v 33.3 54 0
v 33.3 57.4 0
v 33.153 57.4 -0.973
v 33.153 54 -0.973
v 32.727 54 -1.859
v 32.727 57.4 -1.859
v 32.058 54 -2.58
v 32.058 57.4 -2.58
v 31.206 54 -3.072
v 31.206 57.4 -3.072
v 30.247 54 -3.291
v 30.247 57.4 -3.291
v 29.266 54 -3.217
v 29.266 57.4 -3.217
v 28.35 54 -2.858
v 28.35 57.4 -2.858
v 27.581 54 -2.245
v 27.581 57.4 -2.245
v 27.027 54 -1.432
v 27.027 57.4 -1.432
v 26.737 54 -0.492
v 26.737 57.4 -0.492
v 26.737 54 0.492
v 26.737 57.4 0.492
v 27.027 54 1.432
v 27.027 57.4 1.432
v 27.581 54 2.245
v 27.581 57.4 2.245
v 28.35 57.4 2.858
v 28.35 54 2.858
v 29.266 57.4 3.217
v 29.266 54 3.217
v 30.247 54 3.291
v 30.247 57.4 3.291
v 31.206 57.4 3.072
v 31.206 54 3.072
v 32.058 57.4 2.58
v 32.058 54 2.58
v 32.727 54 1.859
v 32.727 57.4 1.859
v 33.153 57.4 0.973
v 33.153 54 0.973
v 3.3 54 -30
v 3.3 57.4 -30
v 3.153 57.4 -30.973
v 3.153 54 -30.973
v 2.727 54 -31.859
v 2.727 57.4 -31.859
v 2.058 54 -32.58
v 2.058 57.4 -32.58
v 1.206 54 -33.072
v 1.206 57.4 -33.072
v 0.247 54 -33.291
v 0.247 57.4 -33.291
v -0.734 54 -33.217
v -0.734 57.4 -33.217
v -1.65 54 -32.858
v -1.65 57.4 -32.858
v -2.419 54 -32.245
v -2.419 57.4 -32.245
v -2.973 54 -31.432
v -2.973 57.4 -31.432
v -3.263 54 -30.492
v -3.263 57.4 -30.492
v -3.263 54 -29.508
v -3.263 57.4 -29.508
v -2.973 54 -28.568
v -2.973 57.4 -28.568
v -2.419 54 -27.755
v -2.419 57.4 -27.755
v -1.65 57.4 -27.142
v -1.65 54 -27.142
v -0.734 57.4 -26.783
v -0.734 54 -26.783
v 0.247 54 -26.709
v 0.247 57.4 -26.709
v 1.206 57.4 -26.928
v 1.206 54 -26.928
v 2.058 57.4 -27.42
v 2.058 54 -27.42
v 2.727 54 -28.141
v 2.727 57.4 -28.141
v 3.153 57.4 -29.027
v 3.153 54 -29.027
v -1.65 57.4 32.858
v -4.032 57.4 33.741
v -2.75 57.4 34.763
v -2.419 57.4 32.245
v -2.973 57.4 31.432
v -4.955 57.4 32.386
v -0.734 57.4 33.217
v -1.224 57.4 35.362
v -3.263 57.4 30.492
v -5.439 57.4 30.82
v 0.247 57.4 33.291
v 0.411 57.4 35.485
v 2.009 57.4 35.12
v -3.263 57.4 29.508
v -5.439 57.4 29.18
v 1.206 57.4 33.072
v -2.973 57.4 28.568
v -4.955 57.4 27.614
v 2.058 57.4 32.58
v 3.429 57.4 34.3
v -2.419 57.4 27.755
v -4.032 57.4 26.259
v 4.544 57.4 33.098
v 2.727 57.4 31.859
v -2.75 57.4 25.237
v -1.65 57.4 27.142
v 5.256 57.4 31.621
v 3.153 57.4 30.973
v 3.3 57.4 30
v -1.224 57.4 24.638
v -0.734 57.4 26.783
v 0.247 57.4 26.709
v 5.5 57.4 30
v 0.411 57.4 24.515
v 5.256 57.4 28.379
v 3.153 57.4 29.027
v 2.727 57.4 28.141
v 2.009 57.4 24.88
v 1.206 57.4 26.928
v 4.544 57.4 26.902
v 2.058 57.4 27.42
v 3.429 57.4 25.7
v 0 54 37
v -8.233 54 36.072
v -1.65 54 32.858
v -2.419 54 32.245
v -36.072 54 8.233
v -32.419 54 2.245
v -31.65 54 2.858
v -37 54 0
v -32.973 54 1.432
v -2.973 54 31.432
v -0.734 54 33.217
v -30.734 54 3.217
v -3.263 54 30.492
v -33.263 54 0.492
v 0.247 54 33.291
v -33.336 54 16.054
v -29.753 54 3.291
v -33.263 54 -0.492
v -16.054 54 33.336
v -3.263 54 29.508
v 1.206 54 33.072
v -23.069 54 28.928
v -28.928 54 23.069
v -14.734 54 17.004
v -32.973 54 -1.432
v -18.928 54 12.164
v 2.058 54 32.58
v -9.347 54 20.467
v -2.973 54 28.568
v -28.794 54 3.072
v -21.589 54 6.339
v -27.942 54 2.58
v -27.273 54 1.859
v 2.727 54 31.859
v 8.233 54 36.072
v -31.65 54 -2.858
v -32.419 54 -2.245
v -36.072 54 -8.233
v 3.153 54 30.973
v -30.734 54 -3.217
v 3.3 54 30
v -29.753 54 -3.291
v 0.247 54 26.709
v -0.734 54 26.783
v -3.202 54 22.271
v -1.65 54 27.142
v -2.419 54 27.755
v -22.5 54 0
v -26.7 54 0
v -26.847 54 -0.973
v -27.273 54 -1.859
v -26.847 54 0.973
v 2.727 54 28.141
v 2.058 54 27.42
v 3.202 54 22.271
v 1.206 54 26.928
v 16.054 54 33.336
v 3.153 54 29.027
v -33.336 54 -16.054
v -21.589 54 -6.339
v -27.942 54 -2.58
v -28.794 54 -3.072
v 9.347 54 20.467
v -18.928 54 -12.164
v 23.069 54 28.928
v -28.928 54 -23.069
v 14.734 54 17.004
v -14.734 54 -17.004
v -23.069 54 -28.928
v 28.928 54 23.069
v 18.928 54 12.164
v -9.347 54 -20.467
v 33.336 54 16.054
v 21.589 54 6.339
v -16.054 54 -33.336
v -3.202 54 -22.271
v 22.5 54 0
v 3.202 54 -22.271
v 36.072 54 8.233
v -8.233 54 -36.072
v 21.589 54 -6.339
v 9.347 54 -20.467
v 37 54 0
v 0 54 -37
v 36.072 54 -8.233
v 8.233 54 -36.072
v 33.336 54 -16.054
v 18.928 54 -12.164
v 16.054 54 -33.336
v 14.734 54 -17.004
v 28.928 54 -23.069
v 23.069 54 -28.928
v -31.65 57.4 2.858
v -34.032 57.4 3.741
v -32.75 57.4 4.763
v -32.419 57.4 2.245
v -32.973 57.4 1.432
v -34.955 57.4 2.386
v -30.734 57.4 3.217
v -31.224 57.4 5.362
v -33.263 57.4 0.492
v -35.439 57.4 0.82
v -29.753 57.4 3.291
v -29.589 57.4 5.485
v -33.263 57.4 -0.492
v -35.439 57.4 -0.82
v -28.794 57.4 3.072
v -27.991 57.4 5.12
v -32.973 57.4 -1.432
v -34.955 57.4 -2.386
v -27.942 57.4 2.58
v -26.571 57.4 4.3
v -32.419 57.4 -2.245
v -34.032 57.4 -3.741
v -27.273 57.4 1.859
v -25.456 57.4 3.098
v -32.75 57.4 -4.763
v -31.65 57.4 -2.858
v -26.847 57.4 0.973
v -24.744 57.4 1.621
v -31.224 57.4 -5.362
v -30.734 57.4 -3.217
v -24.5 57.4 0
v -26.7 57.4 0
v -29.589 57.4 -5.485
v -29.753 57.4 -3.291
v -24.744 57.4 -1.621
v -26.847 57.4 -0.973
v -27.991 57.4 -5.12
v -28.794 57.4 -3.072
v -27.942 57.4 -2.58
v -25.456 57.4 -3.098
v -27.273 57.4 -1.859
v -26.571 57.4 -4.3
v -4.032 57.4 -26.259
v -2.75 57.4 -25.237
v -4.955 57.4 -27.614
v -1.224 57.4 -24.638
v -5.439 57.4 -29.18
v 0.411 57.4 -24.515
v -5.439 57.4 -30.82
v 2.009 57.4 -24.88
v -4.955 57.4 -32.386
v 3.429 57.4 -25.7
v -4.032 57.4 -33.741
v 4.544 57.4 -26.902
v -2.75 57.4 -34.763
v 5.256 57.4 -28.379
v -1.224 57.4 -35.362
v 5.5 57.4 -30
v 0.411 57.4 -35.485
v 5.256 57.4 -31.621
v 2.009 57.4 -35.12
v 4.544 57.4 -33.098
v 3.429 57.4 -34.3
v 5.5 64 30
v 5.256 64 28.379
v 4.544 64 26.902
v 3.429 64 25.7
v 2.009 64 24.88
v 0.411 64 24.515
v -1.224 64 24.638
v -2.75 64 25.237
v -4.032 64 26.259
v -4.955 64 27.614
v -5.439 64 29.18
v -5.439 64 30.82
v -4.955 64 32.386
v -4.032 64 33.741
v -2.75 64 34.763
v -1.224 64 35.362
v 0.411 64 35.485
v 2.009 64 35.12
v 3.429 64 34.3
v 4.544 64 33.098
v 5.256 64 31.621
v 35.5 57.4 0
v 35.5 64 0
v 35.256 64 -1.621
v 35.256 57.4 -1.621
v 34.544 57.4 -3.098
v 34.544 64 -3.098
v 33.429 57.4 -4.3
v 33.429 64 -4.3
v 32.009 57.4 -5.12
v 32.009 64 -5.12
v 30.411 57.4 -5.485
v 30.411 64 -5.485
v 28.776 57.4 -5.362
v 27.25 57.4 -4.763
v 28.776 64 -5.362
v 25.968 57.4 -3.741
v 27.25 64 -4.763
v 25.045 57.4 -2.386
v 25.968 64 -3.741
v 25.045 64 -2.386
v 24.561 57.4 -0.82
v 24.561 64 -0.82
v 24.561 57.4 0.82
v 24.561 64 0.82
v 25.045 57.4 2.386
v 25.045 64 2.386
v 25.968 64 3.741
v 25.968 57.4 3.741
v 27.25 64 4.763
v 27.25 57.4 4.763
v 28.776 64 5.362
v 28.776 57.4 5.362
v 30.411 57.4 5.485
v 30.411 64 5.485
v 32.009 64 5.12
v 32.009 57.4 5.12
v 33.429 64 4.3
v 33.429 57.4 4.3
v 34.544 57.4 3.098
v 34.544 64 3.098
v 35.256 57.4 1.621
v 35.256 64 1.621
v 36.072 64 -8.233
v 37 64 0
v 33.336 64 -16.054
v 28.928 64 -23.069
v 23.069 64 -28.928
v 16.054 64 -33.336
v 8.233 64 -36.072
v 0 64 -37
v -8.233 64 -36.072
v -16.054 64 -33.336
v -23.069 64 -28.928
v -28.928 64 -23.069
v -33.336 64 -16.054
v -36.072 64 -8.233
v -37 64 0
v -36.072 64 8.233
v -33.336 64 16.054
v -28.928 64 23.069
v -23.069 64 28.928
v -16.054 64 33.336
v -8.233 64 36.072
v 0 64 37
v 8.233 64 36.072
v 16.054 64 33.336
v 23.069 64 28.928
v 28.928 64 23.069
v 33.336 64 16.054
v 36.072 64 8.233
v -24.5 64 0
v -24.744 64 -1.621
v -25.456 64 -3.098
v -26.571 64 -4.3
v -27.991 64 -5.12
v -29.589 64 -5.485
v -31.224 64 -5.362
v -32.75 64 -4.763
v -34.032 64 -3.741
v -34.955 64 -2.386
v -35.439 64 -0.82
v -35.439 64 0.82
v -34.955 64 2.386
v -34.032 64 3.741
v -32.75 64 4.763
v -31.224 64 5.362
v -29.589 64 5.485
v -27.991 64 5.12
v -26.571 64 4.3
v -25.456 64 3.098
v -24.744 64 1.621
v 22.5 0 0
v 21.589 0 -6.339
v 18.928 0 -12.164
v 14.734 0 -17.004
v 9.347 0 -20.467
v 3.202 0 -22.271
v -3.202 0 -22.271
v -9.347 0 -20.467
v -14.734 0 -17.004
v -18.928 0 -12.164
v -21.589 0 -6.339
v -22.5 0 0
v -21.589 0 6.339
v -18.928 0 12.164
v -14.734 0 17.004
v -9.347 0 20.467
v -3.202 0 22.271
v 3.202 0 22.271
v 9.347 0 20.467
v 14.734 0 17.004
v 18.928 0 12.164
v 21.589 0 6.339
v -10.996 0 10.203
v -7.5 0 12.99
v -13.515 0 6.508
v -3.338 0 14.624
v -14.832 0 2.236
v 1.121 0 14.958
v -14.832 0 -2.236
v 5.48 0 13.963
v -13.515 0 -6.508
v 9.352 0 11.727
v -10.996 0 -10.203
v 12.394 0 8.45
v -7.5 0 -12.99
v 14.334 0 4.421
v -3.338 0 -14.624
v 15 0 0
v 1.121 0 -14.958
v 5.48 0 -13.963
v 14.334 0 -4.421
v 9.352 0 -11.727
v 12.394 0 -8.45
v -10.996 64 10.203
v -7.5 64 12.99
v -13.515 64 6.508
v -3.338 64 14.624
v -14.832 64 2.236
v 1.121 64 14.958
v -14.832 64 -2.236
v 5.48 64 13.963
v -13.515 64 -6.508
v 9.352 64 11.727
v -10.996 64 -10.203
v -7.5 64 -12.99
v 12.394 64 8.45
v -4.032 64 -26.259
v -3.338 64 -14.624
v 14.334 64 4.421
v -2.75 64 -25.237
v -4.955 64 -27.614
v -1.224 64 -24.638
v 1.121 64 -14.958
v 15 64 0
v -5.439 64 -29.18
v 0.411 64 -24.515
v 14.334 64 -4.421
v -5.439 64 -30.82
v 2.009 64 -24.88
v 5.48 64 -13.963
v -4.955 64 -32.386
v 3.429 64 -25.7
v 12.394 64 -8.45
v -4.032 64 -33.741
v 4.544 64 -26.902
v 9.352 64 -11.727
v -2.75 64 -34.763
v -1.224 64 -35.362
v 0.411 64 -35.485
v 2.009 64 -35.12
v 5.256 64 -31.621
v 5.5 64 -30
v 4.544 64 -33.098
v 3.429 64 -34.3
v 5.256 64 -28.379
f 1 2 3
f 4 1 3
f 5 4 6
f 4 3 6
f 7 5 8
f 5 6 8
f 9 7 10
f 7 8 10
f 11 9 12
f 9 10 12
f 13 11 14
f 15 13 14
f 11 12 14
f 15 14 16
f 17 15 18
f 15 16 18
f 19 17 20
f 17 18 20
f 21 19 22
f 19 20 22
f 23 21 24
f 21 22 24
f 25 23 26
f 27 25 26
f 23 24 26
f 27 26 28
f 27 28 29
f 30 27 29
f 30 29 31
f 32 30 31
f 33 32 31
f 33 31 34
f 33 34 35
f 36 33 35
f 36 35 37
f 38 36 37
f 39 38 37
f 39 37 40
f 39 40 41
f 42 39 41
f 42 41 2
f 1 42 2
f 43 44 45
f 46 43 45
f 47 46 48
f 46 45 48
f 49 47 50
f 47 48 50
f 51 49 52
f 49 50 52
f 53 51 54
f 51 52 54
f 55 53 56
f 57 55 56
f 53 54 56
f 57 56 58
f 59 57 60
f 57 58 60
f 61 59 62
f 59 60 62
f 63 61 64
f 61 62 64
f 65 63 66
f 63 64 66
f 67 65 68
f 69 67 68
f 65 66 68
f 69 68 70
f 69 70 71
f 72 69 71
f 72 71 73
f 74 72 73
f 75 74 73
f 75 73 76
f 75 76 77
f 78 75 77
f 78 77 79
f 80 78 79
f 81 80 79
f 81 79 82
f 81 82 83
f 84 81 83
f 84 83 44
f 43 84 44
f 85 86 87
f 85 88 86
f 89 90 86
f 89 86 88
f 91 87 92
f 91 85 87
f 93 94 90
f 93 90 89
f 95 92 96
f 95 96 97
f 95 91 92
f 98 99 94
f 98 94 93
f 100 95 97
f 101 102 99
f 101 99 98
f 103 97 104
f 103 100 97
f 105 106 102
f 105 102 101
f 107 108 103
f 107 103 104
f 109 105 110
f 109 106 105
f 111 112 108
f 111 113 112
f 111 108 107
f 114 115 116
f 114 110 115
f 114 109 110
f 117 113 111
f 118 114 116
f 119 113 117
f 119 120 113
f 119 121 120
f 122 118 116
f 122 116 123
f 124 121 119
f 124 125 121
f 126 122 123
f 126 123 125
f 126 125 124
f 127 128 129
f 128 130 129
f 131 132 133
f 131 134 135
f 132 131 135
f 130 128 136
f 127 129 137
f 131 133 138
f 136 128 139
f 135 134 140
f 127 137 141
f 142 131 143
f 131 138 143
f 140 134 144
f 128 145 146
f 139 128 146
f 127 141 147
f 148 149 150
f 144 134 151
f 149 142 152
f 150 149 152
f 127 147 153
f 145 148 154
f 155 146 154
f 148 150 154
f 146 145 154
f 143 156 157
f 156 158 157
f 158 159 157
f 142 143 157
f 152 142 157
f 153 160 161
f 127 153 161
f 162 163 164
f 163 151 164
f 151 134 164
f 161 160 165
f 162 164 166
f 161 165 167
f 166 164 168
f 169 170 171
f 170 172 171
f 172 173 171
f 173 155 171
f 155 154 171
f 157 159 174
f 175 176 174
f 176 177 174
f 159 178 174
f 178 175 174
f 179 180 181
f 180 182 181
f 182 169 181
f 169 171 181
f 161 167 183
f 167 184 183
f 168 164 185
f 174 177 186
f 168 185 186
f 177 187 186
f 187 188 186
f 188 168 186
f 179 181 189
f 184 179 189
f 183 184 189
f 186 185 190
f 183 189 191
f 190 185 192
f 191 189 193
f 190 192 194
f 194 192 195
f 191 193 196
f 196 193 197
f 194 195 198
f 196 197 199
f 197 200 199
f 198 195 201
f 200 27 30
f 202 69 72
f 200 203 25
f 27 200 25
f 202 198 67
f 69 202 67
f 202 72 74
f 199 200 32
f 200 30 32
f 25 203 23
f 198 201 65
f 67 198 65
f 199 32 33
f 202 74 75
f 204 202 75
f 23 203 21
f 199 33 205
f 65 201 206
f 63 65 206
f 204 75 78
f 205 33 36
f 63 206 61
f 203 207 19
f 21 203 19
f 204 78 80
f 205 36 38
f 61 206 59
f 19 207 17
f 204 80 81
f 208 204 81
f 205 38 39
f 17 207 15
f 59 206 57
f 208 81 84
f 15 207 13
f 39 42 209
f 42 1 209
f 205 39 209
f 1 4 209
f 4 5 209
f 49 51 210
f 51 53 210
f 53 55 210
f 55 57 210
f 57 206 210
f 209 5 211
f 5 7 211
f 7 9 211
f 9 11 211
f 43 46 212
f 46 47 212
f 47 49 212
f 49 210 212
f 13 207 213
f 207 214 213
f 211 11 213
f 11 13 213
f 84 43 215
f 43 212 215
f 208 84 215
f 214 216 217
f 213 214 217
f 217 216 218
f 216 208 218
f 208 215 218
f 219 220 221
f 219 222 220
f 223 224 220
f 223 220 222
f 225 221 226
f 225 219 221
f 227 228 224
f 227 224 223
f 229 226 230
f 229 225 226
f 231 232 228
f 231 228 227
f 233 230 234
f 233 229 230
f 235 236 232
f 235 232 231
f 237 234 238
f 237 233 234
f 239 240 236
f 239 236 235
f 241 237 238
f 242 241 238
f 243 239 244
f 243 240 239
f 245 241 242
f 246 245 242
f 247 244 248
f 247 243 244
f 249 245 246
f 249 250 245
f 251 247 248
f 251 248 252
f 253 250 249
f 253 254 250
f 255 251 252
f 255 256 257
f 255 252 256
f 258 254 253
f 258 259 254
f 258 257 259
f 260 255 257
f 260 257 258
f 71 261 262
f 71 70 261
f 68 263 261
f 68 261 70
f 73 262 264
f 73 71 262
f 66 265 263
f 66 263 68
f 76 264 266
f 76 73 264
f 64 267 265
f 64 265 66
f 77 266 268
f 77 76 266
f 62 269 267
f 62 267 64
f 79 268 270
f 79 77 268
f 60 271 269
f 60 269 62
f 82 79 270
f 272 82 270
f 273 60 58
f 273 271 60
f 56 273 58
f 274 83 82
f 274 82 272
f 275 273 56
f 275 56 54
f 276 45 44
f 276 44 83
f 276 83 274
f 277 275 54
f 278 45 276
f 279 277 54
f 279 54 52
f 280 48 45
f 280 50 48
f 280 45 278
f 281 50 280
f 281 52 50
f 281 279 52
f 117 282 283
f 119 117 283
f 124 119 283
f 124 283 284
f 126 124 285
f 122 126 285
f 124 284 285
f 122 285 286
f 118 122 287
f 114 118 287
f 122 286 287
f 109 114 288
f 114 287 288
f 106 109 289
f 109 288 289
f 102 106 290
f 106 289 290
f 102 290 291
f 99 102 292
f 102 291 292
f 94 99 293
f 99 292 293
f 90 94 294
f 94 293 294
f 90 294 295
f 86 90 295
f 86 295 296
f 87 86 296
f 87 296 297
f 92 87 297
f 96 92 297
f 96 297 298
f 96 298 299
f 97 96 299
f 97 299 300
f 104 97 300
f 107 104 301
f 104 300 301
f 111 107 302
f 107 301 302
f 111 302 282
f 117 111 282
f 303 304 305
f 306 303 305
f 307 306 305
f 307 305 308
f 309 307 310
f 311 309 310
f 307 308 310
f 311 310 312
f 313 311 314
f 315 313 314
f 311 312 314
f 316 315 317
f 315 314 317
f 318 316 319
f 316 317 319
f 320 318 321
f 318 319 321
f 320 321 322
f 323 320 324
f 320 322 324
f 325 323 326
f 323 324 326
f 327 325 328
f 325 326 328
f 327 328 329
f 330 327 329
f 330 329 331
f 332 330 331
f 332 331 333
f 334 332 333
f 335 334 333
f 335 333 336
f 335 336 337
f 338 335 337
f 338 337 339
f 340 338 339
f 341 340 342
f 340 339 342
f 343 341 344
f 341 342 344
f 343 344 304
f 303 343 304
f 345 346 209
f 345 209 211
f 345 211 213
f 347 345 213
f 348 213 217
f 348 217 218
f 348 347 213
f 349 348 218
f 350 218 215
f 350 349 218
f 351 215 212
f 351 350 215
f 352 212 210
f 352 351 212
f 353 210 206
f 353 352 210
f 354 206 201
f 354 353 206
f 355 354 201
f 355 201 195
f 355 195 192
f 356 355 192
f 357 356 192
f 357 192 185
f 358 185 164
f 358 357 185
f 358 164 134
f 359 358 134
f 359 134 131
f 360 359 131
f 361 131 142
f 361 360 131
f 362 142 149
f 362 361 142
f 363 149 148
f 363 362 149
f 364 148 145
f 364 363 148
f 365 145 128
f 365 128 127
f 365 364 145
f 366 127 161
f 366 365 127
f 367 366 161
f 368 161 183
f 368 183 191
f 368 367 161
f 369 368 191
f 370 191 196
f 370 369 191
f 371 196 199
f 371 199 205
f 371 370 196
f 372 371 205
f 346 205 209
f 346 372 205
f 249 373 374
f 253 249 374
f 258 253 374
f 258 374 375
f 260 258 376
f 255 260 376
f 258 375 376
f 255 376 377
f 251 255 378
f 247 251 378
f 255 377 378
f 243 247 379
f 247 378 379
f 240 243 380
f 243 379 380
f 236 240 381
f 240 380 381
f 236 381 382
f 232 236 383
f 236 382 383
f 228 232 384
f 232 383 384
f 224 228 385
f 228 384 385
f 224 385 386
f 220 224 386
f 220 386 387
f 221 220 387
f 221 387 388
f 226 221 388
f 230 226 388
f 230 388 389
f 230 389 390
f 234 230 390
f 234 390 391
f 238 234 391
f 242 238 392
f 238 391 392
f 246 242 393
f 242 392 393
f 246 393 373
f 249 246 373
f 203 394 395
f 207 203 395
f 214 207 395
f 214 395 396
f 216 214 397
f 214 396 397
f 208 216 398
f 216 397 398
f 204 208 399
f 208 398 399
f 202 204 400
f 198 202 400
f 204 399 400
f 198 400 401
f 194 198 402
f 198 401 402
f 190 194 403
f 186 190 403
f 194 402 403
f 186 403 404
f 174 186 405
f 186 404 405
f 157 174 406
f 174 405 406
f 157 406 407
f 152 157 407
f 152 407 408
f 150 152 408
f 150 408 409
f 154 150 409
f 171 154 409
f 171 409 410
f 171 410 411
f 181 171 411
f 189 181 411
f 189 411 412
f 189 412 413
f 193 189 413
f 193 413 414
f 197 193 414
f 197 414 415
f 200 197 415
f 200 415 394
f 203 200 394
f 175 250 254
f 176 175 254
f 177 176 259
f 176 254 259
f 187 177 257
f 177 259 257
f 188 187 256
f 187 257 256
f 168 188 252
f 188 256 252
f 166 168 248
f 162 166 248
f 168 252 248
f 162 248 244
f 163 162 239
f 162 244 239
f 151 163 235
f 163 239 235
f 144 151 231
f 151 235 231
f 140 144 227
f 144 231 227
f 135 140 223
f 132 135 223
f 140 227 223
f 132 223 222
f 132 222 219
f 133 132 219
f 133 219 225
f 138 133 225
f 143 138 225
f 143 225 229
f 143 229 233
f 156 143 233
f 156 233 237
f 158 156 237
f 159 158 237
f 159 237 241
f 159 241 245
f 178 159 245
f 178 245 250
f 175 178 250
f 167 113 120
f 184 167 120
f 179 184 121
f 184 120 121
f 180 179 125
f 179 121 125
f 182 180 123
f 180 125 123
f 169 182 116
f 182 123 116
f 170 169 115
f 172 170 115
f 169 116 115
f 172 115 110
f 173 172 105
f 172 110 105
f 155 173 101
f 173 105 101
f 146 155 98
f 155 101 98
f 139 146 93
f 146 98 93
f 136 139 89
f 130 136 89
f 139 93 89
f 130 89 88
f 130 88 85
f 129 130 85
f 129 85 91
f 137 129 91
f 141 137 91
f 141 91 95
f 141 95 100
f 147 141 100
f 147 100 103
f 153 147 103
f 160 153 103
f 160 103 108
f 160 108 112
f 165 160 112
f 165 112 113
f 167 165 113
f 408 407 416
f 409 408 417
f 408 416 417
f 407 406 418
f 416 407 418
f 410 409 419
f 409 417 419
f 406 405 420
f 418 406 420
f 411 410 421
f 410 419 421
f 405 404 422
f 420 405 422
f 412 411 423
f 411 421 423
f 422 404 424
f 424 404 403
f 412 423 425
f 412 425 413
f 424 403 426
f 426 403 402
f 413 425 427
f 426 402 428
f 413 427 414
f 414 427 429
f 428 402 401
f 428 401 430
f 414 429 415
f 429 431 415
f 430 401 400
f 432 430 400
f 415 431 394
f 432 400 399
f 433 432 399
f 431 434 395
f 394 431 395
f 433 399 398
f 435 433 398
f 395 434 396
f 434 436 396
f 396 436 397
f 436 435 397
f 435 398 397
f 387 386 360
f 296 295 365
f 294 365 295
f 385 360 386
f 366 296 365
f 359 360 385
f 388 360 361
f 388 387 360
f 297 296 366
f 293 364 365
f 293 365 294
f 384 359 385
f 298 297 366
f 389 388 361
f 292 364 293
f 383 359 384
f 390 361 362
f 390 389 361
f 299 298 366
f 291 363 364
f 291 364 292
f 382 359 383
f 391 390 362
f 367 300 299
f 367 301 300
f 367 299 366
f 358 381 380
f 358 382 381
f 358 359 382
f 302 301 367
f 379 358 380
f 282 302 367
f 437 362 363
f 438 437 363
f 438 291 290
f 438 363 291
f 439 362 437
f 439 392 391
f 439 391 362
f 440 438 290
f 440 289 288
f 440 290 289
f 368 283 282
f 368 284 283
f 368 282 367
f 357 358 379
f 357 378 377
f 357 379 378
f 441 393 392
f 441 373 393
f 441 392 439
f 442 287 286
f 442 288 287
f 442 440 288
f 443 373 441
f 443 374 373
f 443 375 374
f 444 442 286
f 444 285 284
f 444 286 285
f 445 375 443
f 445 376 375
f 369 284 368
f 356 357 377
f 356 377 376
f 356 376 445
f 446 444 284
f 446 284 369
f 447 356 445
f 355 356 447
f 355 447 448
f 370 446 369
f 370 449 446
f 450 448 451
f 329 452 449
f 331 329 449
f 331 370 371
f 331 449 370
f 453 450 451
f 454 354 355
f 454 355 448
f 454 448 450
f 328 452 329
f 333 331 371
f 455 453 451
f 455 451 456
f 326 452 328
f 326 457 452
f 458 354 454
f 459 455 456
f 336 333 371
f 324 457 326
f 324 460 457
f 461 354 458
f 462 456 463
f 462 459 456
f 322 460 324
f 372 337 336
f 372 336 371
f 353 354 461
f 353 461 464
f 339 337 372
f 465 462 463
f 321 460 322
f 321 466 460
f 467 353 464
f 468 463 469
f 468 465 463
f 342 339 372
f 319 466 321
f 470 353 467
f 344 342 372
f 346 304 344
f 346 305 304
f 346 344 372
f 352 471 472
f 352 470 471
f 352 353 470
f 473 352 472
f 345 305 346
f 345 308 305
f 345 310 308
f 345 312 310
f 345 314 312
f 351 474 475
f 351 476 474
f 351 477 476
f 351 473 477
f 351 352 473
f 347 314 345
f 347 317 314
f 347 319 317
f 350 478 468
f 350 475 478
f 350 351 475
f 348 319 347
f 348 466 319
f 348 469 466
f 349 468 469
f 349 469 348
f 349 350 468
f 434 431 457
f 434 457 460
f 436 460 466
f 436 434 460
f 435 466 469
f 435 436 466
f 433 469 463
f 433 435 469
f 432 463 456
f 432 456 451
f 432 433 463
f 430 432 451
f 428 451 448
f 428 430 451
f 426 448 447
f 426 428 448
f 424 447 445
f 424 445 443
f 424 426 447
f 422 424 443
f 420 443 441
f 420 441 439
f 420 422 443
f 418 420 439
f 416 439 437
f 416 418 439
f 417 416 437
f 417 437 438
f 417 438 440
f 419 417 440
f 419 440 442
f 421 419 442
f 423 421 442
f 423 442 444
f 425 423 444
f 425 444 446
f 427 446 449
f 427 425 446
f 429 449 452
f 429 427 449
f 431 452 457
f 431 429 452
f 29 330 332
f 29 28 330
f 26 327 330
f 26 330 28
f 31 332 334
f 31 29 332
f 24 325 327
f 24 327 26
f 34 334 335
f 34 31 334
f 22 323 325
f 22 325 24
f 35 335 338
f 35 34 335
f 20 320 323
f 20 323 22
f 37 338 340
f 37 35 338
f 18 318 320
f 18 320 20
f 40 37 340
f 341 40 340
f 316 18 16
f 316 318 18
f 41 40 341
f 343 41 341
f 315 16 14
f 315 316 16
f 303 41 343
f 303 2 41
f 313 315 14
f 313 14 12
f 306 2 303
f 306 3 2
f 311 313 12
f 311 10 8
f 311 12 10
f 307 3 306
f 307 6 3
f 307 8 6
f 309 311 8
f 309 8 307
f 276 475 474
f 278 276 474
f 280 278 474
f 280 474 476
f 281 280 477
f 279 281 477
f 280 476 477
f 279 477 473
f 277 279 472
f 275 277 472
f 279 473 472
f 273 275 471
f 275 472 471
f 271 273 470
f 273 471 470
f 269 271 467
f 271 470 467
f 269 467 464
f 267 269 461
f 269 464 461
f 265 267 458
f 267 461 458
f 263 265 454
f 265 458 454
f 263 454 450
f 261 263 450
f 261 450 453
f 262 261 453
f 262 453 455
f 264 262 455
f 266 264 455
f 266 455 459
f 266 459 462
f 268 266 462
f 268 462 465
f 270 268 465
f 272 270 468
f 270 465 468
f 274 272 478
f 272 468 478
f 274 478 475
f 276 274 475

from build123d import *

# Parameters (mm, degrees)
SKETCH_1_R          = 22.5
SKETCH_1_R_2        = 15
EXTRUDE_1_DEPTH     = 64
SKETCH_2_R          = 37
SKETCH_2_R_2        = 22.5
EXTRUDE_2_DEPTH     = 10
SKETCH_3_R          = 5.5
CUT_EXTRUDE_1_DEPTH = 6.6
SKETCH_4_R          = 3.3
CUT_EXTRUDE_2_DEPTH = 65


with BuildPart() as part:
    # 草图1 → 凸台-拉伸1 (new body)
    with BuildSketch(Plane(origin=(0, 0, 0), x_dir=(1, 0, 0), z_dir=(0, 1, 0))):
        Circle(SKETCH_1_R)
        Circle(SKETCH_1_R_2, mode=Mode.SUBTRACT)
    extrude(amount=EXTRUDE_1_DEPTH)

    # 草图2 → 凸台-拉伸2 (add)
    with BuildSketch(Plane(origin=(0, 64, 0), x_dir=(1, 0, 0), z_dir=(0, 1, 0))):
        Circle(SKETCH_2_R)
        Circle(SKETCH_2_R_2, mode=Mode.SUBTRACT)
    extrude(amount=-EXTRUDE_2_DEPTH)

    # 草图3 → 切除-拉伸1 (cut)
    with BuildSketch(Plane(origin=(0, 64, 0), x_dir=(1, 0, 0), z_dir=(0, 1, 0))):
        with Locations((0, 30)):
            Circle(SKETCH_3_R)
        with Locations((30, 0)):
            Circle(SKETCH_3_R)
        with Locations((0, -30)):
            Circle(SKETCH_3_R)
        with Locations((-30, 0)):
            Circle(SKETCH_3_R)
    extrude(amount=-CUT_EXTRUDE_1_DEPTH, mode=Mode.SUBTRACT)

    # 草图4 → 切除-拉伸2 (cut, through all)
    with BuildSketch(Plane(origin=(0, 64, 0), x_dir=(1, 0, 0), z_dir=(0, 1, 0))):
        with Locations((0, 30)):
            Circle(SKETCH_4_R)
        with Locations((30, 0)):
            Circle(SKETCH_4_R)
        with Locations((0, -30)):
            Circle(SKETCH_4_R)
        with Locations((-30, 0)):
            Circle(SKETCH_4_R)
    extrude(amount=-CUT_EXTRUDE_2_DEPTH, mode=Mode.SUBTRACT)


solid = part.part
